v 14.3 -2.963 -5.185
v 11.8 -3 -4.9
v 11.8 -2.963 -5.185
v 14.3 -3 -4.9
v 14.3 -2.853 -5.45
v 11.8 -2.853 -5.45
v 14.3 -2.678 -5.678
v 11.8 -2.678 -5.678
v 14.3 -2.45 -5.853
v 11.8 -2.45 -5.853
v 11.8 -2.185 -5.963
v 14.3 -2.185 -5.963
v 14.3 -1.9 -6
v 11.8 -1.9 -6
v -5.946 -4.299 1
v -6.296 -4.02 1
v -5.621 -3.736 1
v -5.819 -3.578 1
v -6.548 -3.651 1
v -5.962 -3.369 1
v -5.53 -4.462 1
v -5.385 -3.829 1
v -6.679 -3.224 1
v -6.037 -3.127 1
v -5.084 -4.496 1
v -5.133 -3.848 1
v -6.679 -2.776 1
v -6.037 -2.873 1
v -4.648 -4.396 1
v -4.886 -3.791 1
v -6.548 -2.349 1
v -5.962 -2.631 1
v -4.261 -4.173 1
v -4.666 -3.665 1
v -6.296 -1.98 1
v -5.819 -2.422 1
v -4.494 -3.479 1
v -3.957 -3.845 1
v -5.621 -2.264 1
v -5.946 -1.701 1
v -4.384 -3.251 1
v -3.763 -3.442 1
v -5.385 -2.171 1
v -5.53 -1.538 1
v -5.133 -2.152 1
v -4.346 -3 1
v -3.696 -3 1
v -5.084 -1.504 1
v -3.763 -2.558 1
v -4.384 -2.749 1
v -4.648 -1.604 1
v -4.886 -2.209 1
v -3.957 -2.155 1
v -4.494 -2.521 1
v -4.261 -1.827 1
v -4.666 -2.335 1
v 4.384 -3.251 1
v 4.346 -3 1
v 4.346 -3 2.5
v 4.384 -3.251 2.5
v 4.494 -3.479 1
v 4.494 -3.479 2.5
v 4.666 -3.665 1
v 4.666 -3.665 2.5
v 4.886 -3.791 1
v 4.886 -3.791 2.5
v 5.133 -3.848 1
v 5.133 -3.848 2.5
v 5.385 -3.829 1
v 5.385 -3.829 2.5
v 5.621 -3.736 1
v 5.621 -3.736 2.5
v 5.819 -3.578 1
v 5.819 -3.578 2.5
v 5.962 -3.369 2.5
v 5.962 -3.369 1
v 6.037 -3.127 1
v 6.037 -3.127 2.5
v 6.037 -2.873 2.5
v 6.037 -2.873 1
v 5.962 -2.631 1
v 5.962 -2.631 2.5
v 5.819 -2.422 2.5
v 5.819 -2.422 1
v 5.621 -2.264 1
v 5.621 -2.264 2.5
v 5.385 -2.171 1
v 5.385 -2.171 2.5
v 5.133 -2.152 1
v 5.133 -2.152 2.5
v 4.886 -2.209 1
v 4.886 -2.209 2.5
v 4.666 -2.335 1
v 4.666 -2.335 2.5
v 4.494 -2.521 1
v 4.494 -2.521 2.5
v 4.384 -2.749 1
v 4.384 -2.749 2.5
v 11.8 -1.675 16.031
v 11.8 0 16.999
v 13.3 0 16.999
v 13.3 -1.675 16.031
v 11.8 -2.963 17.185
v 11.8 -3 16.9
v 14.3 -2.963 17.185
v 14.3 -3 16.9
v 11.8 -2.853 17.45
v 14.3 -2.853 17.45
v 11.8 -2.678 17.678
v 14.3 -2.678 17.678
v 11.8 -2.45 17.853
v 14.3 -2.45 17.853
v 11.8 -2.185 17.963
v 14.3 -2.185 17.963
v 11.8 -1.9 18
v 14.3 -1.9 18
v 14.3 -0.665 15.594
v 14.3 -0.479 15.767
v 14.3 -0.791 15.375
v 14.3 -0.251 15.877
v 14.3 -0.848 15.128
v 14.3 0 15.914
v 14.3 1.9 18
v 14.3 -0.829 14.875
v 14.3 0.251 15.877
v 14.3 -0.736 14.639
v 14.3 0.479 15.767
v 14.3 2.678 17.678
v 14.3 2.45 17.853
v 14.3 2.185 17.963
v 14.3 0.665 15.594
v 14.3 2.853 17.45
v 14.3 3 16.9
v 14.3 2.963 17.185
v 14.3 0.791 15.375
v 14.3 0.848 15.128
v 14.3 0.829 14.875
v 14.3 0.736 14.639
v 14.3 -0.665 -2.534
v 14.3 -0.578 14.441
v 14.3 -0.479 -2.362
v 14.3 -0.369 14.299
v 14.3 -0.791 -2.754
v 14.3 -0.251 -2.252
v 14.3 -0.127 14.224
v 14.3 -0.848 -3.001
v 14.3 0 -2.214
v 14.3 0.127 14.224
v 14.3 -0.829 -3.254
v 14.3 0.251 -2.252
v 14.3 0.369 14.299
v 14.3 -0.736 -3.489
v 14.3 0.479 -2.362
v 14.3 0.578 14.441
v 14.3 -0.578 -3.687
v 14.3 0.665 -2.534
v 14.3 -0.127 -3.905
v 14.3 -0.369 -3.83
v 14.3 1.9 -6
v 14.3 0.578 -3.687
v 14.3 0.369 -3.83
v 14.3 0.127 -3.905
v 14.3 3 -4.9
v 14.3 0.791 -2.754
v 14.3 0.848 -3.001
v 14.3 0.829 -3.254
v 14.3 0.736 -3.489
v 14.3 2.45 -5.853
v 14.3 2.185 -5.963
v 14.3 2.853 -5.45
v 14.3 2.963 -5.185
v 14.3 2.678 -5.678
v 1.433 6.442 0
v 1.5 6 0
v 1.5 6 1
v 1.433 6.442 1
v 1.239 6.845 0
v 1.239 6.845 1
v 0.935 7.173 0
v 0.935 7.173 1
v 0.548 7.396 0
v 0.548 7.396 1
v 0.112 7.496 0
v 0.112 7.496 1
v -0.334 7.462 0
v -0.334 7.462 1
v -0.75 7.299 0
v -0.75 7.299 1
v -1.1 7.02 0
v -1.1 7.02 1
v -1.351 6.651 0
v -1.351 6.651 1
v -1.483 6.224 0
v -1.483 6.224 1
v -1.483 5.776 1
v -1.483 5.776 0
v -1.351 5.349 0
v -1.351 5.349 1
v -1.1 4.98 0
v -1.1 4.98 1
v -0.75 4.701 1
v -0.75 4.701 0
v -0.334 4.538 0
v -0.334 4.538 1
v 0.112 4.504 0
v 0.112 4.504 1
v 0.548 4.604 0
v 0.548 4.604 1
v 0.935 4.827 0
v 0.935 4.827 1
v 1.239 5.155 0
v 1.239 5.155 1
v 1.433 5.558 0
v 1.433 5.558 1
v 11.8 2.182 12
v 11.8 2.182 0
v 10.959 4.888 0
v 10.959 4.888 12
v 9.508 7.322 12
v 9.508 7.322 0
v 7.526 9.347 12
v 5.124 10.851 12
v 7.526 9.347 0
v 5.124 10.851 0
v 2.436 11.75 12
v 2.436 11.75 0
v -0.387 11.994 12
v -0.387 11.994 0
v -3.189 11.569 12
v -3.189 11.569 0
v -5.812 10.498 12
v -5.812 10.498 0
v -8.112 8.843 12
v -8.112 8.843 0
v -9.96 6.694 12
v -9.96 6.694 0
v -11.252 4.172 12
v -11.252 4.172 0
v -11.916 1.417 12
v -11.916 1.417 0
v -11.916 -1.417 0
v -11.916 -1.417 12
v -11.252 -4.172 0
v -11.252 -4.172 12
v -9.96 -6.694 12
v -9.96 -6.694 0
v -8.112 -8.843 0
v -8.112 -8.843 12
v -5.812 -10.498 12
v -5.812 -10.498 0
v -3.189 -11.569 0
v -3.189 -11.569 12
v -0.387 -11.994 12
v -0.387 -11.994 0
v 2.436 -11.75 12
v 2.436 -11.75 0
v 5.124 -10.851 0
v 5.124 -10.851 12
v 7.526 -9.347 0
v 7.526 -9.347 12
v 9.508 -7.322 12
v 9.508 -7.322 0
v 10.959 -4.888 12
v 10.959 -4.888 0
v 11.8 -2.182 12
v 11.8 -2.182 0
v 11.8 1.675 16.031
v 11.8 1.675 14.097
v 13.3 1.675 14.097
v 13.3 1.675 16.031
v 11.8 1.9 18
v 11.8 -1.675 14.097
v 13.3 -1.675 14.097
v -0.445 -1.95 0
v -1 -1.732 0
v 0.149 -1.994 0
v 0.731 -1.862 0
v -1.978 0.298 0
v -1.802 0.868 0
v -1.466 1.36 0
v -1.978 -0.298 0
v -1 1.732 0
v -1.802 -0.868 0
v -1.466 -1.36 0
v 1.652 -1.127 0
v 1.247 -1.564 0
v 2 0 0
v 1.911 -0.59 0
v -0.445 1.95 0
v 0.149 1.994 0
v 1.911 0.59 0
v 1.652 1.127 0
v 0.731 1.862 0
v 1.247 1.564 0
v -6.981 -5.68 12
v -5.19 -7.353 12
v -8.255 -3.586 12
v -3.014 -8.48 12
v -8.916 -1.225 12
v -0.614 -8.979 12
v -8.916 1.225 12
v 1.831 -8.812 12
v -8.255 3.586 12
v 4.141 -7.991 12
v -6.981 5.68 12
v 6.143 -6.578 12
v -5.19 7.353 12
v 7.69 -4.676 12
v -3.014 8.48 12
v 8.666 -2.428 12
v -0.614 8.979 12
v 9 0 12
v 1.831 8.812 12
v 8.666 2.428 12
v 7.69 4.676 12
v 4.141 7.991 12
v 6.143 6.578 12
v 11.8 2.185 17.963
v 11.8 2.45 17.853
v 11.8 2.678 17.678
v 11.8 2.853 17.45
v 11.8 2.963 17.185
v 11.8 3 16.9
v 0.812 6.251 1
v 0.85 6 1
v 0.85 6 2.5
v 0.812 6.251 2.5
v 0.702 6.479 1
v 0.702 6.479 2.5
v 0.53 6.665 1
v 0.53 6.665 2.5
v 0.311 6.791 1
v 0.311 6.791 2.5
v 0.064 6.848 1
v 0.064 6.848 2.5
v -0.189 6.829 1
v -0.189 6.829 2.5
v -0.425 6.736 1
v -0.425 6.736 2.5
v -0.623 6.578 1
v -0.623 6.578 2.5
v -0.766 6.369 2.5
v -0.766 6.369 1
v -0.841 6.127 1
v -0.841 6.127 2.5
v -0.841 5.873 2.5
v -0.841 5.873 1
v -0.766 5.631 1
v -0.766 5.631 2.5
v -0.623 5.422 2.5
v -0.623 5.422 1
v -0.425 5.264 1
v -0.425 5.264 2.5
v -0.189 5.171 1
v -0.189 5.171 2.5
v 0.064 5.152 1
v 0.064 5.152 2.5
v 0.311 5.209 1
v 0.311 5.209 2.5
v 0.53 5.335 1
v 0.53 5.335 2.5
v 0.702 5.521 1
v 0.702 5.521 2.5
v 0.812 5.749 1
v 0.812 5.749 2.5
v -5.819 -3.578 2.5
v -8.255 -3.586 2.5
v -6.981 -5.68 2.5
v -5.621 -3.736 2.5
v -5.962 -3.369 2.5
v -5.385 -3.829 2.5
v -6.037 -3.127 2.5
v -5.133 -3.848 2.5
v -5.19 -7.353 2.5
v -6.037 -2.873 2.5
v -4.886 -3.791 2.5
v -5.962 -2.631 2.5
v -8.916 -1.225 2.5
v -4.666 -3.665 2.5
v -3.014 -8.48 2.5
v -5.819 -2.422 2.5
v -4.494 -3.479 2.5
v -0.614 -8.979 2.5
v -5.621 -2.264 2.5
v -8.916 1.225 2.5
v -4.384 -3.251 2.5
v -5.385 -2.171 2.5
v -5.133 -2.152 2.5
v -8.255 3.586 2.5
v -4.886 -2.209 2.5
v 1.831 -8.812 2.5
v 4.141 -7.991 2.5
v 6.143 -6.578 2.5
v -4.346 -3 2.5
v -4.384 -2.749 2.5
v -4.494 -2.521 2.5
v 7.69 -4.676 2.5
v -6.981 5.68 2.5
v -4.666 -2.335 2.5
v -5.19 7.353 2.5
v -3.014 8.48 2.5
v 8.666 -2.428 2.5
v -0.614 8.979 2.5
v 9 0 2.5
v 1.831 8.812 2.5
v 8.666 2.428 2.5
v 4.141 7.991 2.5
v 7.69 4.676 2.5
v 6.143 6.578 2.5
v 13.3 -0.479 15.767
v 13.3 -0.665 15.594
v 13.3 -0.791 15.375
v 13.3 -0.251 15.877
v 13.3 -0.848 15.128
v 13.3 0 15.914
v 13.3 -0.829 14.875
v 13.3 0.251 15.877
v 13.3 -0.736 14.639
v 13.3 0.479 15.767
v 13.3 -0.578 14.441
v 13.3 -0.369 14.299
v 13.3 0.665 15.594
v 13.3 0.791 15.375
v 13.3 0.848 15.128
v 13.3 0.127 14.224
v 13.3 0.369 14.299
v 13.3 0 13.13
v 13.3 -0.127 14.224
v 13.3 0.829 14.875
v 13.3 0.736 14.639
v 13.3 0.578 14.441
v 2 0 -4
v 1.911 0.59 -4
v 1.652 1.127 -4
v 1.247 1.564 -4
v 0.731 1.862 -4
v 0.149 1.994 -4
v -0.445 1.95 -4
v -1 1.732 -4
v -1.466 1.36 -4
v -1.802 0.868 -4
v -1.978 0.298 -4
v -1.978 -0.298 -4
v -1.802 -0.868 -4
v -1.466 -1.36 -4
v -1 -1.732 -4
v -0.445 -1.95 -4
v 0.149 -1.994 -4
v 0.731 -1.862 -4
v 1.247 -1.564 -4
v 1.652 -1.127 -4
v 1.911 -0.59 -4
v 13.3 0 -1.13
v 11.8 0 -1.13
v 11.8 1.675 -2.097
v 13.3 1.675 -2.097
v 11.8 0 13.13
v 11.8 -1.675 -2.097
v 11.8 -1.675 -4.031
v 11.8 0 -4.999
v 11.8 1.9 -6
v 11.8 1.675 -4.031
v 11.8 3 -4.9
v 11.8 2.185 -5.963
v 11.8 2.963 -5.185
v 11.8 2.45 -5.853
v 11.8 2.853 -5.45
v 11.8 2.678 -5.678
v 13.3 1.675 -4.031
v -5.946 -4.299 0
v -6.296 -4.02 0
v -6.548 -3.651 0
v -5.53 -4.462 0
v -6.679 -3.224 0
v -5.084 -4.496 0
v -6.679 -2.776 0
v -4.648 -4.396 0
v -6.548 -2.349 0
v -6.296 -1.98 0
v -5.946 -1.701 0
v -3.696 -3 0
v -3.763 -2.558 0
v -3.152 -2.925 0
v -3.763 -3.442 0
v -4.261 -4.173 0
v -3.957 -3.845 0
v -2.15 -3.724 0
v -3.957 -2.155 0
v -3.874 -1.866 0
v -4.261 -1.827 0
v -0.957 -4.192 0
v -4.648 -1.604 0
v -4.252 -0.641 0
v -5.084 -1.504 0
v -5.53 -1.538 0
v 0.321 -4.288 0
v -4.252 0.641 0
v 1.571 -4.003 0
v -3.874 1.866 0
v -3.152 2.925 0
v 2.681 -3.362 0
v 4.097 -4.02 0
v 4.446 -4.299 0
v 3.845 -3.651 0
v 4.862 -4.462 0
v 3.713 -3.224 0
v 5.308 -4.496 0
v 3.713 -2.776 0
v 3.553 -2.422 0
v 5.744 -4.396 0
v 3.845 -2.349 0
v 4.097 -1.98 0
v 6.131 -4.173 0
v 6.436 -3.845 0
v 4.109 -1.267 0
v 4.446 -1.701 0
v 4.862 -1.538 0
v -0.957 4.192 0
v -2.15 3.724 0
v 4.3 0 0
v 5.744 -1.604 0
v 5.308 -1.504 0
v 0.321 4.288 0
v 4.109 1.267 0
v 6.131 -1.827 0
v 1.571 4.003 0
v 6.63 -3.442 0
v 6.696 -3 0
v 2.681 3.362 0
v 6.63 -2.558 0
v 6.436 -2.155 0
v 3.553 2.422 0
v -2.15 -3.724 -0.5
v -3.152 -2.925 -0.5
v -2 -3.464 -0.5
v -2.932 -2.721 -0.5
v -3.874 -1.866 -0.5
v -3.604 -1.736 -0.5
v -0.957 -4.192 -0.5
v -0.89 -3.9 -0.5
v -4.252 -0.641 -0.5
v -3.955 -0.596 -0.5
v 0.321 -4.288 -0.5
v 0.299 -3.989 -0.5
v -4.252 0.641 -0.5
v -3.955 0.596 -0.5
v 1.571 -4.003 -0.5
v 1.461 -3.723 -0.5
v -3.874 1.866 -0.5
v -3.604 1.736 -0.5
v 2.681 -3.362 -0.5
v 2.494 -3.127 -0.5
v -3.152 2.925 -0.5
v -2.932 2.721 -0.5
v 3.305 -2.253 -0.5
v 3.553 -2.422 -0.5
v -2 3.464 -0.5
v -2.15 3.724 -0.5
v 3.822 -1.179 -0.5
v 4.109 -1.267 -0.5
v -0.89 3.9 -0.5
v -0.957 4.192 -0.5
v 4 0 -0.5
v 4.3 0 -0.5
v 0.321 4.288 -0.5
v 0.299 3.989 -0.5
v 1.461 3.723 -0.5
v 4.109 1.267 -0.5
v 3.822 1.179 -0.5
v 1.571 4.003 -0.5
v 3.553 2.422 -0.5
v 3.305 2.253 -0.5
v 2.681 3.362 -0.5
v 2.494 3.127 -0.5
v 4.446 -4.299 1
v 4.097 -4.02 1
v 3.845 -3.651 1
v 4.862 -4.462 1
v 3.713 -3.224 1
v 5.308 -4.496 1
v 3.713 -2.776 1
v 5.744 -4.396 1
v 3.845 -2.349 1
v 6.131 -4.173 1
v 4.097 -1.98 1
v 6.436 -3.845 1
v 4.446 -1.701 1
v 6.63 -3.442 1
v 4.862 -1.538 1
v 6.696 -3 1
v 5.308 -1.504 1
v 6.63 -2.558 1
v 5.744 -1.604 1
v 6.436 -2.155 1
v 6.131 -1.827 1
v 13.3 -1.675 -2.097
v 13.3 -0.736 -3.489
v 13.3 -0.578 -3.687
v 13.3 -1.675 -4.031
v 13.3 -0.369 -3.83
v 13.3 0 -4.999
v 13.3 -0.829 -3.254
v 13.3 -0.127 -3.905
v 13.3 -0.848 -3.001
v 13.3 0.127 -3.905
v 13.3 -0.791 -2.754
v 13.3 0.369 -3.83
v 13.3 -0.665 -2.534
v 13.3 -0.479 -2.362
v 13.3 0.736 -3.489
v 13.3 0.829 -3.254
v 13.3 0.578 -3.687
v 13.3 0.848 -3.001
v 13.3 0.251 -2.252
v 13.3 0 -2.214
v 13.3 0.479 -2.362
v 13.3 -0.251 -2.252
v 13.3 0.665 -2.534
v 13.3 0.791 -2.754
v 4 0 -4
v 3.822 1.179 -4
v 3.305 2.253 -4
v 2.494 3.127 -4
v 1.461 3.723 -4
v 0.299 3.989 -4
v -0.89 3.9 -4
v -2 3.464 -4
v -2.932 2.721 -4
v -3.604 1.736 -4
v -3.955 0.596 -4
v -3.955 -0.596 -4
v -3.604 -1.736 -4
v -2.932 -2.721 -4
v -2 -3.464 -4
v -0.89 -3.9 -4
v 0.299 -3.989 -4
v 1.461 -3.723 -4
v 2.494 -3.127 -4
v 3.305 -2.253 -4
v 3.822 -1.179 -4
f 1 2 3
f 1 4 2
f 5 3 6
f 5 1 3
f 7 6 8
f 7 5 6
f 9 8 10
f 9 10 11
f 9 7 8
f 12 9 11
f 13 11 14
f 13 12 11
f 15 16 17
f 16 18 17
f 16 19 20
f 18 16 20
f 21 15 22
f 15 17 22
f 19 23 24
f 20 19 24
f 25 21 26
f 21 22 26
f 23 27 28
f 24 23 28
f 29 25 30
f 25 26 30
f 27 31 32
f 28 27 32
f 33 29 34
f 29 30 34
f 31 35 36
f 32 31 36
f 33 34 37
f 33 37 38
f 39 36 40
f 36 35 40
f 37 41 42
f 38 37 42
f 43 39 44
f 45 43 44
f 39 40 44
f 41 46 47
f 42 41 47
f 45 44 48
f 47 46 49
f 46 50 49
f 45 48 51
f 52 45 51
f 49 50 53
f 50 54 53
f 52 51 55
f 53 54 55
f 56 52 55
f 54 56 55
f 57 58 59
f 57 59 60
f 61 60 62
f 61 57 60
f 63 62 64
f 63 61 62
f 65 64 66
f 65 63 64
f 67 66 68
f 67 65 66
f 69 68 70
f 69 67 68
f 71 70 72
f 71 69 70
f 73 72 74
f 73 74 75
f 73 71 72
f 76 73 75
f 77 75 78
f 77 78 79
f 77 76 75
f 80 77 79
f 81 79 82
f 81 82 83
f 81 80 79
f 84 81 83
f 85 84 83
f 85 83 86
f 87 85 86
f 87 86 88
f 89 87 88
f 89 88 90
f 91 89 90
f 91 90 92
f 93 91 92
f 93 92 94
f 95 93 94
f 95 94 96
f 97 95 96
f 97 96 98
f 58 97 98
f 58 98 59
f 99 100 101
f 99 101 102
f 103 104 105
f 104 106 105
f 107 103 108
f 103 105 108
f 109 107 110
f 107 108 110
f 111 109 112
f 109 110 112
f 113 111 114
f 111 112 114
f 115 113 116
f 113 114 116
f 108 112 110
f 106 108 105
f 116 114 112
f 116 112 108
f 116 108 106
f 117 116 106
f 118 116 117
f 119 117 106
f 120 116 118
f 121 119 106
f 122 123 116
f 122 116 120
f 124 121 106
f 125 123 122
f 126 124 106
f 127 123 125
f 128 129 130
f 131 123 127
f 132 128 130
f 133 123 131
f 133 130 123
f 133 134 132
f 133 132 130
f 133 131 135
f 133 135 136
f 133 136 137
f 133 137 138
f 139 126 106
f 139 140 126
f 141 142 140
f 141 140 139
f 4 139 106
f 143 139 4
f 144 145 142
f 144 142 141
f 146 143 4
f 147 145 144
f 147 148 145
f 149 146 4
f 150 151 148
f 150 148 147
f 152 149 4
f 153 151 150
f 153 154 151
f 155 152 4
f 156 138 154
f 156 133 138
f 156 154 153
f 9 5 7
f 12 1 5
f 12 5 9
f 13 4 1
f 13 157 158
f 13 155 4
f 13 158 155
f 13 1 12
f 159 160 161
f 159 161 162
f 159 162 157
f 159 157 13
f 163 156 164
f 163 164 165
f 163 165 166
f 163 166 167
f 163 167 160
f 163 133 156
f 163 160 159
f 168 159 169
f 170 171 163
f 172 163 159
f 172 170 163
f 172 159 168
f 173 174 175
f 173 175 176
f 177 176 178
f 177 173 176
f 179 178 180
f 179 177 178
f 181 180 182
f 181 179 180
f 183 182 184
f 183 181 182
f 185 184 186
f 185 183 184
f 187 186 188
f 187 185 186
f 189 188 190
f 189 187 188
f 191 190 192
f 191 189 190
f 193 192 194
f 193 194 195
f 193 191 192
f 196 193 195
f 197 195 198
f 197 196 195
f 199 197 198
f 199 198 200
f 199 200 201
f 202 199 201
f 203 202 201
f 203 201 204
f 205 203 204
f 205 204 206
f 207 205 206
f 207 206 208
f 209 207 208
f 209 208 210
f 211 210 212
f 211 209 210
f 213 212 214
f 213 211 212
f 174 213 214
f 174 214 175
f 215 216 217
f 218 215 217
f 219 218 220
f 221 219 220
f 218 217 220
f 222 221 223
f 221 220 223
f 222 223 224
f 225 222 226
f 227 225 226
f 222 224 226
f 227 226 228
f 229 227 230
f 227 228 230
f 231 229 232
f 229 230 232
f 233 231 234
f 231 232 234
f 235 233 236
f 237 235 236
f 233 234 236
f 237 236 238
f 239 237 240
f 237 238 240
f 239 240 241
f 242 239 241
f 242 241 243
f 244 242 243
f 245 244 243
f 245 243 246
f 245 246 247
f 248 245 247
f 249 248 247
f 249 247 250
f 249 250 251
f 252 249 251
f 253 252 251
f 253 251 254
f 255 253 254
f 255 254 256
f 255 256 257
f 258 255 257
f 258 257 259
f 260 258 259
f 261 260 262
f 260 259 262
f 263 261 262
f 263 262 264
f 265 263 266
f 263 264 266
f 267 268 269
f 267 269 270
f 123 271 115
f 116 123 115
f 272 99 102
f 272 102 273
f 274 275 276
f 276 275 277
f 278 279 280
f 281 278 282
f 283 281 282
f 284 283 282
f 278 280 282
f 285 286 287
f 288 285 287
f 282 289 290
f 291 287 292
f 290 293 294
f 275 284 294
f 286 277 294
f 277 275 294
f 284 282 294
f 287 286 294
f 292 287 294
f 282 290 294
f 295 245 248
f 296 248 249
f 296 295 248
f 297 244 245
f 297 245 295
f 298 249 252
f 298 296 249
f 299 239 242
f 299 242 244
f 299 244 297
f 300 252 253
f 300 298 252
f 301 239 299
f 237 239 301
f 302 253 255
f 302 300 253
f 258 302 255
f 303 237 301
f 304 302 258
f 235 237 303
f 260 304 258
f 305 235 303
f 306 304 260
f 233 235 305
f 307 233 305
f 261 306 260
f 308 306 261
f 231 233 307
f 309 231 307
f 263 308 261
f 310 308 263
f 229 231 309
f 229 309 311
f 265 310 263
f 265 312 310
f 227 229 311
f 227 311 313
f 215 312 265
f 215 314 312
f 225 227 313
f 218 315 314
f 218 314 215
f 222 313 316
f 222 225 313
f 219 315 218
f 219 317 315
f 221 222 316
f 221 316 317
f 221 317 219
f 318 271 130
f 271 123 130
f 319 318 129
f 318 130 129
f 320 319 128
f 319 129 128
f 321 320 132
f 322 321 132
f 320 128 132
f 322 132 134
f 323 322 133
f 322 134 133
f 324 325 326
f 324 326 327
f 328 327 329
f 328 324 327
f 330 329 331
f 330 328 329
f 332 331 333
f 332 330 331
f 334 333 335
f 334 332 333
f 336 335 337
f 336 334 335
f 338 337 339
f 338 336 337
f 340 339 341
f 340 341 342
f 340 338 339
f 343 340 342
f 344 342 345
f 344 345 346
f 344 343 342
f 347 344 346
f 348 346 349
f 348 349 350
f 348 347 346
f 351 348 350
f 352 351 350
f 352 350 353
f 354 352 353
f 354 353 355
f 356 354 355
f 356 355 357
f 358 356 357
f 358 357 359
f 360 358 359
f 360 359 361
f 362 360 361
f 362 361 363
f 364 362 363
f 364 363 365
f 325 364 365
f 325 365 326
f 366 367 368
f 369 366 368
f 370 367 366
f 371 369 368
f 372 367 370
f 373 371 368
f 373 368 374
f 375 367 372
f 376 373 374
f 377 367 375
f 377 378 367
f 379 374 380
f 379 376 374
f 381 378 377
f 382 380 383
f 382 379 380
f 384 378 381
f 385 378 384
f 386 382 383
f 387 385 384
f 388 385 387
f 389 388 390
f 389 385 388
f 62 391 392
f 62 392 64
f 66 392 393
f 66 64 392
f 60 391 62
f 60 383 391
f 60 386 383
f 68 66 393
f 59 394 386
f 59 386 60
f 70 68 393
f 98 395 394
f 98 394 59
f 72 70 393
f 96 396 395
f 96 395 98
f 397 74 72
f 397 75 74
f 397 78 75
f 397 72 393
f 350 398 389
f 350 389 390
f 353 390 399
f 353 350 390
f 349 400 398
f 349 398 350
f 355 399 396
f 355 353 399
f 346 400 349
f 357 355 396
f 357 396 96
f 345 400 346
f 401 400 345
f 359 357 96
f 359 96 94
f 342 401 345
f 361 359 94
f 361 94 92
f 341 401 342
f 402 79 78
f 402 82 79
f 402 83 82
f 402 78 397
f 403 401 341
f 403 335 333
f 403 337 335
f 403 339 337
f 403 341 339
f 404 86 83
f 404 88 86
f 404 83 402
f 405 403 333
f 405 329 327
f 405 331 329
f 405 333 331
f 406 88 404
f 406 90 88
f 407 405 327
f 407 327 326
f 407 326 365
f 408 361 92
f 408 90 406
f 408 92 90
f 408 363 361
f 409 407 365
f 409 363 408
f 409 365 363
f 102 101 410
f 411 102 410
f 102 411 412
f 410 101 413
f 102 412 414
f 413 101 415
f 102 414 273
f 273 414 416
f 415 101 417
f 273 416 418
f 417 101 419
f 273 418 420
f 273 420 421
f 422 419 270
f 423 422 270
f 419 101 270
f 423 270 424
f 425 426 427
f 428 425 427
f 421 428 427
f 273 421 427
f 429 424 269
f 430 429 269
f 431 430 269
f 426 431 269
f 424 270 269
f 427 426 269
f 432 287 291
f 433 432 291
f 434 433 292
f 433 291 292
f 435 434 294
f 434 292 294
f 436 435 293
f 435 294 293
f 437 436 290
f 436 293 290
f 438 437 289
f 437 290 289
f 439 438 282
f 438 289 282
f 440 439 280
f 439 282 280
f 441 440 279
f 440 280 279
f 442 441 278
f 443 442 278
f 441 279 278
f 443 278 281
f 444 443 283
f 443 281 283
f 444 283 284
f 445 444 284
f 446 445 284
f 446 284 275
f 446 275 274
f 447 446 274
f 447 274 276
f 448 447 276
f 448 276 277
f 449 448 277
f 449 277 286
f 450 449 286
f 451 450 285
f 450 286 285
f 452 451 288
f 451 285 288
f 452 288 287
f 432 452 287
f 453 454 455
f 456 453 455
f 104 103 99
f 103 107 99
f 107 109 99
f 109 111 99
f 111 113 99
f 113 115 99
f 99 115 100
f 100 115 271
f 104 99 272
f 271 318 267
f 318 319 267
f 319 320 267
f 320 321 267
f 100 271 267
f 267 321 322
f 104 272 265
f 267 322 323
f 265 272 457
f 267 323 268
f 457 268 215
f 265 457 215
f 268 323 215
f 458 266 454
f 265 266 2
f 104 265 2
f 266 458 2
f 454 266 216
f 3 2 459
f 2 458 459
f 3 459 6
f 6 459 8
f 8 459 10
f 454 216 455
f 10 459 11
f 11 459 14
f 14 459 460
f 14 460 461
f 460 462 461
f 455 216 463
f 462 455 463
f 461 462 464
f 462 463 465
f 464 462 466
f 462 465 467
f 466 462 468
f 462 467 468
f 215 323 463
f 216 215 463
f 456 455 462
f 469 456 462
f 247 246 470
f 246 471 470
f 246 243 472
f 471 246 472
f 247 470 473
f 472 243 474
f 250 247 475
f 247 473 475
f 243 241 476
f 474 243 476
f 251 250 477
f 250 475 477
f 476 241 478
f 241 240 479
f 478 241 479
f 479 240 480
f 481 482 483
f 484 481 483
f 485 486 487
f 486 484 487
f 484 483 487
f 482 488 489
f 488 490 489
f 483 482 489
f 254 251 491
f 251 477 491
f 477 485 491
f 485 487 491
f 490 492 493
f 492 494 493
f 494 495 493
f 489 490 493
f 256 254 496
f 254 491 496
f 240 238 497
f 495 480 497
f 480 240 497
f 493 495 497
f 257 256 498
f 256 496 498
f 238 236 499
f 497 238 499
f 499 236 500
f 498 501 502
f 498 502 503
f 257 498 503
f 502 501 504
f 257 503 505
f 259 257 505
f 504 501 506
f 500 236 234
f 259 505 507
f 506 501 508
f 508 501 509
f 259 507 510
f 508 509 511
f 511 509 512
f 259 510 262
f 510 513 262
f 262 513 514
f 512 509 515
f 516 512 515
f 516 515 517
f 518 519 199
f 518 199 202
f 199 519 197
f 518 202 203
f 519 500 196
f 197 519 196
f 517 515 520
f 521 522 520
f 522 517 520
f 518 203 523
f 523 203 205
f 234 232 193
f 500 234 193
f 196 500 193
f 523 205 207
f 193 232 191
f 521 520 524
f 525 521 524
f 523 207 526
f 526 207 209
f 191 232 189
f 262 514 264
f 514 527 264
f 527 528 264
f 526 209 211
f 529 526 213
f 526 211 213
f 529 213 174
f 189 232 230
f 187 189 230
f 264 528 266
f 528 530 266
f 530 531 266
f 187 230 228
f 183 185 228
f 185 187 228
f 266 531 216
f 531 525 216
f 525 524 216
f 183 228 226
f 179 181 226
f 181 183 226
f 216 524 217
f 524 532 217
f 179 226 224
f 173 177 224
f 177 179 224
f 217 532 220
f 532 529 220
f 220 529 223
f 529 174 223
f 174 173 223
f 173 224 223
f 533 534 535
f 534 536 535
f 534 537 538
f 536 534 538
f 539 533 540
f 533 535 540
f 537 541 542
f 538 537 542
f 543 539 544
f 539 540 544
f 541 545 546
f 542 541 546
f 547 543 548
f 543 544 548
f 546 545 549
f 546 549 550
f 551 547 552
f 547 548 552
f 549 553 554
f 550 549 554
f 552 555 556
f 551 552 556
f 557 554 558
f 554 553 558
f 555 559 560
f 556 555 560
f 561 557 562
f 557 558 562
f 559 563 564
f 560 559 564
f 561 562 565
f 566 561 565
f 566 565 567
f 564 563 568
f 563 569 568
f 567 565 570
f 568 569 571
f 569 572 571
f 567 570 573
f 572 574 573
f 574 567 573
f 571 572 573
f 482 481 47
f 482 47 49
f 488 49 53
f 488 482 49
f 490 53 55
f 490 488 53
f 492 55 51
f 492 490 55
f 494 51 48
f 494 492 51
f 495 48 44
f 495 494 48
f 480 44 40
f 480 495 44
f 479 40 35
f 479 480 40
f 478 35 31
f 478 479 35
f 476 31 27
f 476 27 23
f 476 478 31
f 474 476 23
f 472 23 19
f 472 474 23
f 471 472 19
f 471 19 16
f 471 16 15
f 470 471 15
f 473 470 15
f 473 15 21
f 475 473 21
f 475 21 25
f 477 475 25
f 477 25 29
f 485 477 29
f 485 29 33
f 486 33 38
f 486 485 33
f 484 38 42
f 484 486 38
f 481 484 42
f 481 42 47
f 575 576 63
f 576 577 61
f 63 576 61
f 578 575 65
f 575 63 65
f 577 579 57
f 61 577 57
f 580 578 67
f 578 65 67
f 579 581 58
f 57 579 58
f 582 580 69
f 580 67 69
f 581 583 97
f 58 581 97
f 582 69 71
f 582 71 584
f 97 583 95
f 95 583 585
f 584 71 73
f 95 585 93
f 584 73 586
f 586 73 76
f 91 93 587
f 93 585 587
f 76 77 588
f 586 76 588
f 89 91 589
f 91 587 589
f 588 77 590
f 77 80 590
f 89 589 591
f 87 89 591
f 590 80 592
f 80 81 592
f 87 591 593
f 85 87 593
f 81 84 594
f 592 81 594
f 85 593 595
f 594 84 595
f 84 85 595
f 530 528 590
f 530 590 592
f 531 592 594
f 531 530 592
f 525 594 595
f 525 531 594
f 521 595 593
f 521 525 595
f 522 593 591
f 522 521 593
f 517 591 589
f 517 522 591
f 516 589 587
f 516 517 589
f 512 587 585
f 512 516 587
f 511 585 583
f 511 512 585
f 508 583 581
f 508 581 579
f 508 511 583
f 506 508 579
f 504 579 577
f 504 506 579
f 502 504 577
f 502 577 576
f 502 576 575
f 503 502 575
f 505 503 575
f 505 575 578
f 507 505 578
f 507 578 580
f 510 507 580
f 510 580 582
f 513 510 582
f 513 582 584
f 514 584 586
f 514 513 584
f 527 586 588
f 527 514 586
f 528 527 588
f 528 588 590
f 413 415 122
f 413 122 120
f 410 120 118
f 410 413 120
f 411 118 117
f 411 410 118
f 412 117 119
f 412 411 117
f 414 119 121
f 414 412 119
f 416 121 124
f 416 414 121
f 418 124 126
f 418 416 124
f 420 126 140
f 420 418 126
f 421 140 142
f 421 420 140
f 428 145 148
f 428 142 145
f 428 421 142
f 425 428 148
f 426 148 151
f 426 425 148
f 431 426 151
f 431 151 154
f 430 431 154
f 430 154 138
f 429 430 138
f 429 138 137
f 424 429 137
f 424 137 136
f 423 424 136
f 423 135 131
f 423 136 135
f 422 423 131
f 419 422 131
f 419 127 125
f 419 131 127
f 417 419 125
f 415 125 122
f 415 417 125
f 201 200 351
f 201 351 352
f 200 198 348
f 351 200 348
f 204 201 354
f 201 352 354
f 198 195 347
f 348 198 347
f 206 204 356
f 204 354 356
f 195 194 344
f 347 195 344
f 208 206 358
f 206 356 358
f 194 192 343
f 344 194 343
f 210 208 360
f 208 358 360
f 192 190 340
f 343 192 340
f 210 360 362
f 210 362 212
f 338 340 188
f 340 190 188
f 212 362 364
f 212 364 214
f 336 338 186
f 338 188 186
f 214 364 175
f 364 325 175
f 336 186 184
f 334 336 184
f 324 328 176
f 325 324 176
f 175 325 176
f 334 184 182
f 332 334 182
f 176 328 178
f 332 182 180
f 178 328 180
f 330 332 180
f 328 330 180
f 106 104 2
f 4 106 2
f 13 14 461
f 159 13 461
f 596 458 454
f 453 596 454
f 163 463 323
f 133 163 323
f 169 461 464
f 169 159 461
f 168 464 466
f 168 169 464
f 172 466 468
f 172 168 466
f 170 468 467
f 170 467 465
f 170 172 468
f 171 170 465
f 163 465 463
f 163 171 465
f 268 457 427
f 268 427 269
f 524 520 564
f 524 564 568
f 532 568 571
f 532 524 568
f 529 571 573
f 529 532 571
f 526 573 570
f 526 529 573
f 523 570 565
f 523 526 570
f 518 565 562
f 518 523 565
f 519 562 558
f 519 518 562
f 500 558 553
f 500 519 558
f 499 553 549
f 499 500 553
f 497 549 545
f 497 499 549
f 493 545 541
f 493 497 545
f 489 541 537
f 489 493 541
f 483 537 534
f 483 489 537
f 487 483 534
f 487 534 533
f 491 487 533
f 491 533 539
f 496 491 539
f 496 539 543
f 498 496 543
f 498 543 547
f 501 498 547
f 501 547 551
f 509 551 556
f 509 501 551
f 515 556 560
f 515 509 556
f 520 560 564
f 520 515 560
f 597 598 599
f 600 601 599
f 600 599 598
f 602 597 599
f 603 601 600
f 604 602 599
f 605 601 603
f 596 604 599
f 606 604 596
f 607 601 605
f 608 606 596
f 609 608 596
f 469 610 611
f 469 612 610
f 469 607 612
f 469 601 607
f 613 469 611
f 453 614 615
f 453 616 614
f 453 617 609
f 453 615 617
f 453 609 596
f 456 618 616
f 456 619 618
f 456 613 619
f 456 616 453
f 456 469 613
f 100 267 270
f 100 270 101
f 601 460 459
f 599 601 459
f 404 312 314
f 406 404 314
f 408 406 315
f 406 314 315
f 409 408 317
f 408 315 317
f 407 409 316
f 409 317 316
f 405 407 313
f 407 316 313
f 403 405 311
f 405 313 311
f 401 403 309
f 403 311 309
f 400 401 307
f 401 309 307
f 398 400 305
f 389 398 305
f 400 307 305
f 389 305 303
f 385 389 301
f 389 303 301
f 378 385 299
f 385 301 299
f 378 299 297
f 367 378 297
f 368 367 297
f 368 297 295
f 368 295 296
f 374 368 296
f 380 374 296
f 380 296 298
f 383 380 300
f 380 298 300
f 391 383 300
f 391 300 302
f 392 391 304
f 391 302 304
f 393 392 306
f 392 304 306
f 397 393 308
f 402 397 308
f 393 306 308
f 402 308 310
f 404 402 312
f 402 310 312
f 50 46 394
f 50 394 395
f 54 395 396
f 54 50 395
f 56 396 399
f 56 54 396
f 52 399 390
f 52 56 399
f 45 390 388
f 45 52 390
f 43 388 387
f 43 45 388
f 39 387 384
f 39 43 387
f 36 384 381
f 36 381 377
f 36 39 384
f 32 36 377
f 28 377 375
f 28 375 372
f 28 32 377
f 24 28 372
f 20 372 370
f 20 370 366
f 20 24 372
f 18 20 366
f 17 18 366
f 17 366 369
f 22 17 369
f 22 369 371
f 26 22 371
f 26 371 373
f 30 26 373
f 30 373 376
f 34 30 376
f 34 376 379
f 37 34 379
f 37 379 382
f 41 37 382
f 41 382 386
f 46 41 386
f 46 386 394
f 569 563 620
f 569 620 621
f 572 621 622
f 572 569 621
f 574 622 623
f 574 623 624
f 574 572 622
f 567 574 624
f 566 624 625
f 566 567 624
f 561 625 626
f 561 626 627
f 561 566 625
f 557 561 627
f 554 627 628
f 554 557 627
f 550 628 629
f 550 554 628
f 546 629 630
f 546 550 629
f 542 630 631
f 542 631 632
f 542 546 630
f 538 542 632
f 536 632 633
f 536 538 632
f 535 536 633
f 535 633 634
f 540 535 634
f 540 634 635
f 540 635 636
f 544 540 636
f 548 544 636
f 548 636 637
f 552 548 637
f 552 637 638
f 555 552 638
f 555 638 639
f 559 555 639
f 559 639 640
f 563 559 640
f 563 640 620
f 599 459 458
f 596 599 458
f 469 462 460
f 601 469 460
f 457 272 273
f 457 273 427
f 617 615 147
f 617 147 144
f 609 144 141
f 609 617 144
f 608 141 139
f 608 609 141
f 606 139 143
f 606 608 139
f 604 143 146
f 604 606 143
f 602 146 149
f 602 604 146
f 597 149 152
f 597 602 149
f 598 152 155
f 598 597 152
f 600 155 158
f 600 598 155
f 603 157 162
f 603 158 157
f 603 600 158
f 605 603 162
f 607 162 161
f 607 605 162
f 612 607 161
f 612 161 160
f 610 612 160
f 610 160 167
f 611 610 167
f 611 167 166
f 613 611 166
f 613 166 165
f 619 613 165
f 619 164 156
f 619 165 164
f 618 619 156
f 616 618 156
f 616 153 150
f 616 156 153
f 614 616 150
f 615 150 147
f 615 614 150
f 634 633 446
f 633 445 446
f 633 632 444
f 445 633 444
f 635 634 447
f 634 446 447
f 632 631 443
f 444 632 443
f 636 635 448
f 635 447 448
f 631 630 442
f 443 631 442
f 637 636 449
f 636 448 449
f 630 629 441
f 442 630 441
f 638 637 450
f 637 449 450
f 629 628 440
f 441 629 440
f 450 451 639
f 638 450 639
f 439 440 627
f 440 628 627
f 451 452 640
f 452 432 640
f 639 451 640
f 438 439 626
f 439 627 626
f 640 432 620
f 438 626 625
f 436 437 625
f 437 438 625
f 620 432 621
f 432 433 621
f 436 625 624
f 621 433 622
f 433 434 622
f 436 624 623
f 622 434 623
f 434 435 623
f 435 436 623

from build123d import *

# Parameters (mm, degrees)
SKETCH_1_R                = 12
EXTRUDE_1_DEPTH           = 12
SKETCH_1_4_R              = 0.85
CUT_EXTRUDE_2_DEPTH       = 2.5
SKETCH_1_5_R              = 4
EXTRUDE_2_DEPTH           = 4
SKETCH_1_6_R              = 4.3
EXTRUDE_3_DEPTH           = 0.5
SKETCH_1_7_R              = 2
CUT_EXTRUDE_3_DEPTH       = 4
SKETCH_1_8_R              = 1.5
CUT_EXTRUDE_5_DEPTH       = 1
CUT_EXTRUDE_START         = 12
SKETCH_1_10_R             = 9
CUT_EXTRUDE_6_DEPTH       = 9.5
EXTRUDE_8_DEPTH           = 0.3
EXTRUDE_8_DEPTH_BACK      = 2.2
CUT_EXTRUDE_START_2       = -2.2
CUT_EXTRUDE_20_DEPTH      = 1.5
CUT_EXTRUDE_21_DEPTH      = 1
CUT_EXTRUDE_21_DEPTH_BACK = 2
SKETCH_3_10_R             = 0.85
FILLET_3_R                = 1.1


with BuildPart() as part:
    # 草图1 → 凸台-拉伸1 (new body)
    with BuildSketch(Plane.XY):
        Circle(SKETCH_1_R)
    extrude(amount=EXTRUDE_1_DEPTH)

    # 草图1<4> → 切除-拉伸2 (cut)
    with BuildSketch(Plane.XY):
        with Locations((0, 6)):
            Circle(SKETCH_1_4_R)
        with Locations((-5.196152423, -3)):
            Circle(SKETCH_1_4_R)
        with Locations(Location((5.196152423, -3, 0), (0, 0, 180))):
            Circle(SKETCH_1_4_R)
    extrude(amount=CUT_EXTRUDE_2_DEPTH, mode=Mode.SUBTRACT)

    # 草图1<5> → 凸台-拉伸2 (add)
    with BuildSketch(Plane.XY):
        Circle(SKETCH_1_5_R)
    extrude(amount=-EXTRUDE_2_DEPTH)

    # 草图1<6> → 凸台-拉伸3 (add)
    with BuildSketch(Plane.XY):
        Circle(SKETCH_1_6_R)
    extrude(amount=-EXTRUDE_3_DEPTH)

    # 草图1<7> → 切除-拉伸3 (cut)
    with BuildSketch(Plane.XY):
        Circle(SKETCH_1_7_R)
    extrude(amount=-CUT_EXTRUDE_3_DEPTH, mode=Mode.SUBTRACT)

    # 草图1<8> → 切除-拉伸5 (cut)
    with BuildSketch(Plane.XY):
        with Locations((-5.196152423, -3)):
            Circle(SKETCH_1_8_R)
        with Locations((5.196152423, -3)):
            Circle(SKETCH_1_8_R)
        with Locations((0, 6)):
            Circle(SKETCH_1_8_R)
    extrude(amount=CUT_EXTRUDE_5_DEPTH, mode=Mode.SUBTRACT)

    # 草图1<10> → 切除-拉伸6 (cut)
    with BuildSketch(Plane.XY.offset(CUT_EXTRUDE_START)):
        Circle(SKETCH_1_10_R)
    extrude(amount=-CUT_EXTRUDE_6_DEPTH, mode=Mode.SUBTRACT)

    # 草图3 → 凸台-拉伸8 (add, two sides: drawn at the far end of the back side and taken through both)
    with BuildSketch(Plane(origin=(14, 0, 0), x_dir=(0, 0, -1), z_dir=(1, 0, 0)).offset(-EXTRUDE_8_DEPTH_BACK)):
        Polygon((-18, -3), (-12, -3), (-6, -3), (-6, 3), (-18, 3), align=None)
        Polygon((-6, 3), (-6, -3), (0, -3), (6, -3), (6, 3), align=None)
    extrude(amount=EXTRUDE_8_DEPTH + EXTRUDE_8_DEPTH_BACK)

    # 草图3<9> → 切除-拉伸20 (cut)
    with BuildSketch(Plane(origin=(14, 0, 0), x_dir=(0, 0, -1), z_dir=(1, 0, 0)).offset(CUT_EXTRUDE_START_2)):
        Polygon((-13.130266283, 0), (-14.097327984, 1.675), (-16.031451386, 1.675), (-16.998513087, 0), (-16.031451386, -1.675), (-14.097327984, -1.675), align=None)
        Polygon((1.130266283, 0), (2.097327984, 1.675), (4.031451386, 1.675), (4.998513087, 0), (4.031451386, -1.675), (2.097327984, -1.675), align=None)
    extrude(amount=CUT_EXTRUDE_20_DEPTH, mode=Mode.SUBTRACT)

    # 草图3<10> → 切除-拉伸21 (cut, two sides: drawn at the far end of the back side and taken through both)
    with BuildSketch(Plane(origin=(14, 0, 0), x_dir=(0, 0, -1), z_dir=(1, 0, 0)).offset(-CUT_EXTRUDE_21_DEPTH_BACK)):
        with Locations(Location((3.064389685, 0, 0), (0, 0, 180))):
            Circle(SKETCH_3_10_R)
        with Locations(Location((-15.064389685, 0, 0), (0, 0, 180))):
            Circle(SKETCH_3_10_R)
    extrude(amount=CUT_EXTRUDE_21_DEPTH + CUT_EXTRUDE_21_DEPTH_BACK, mode=Mode.SUBTRACT)

    # 圆角3
    fillet_3_edges = [part.edges().sort_by_distance(p)[0] for p in [
        (13.05, 3, 18),
        (13.05, -3, 18),
        (13.05, 3, -6),
        (13.05, -3, -6),
    ]]
    fillet(fillet_3_edges, radius=FILLET_3_R)


solid = part.part
